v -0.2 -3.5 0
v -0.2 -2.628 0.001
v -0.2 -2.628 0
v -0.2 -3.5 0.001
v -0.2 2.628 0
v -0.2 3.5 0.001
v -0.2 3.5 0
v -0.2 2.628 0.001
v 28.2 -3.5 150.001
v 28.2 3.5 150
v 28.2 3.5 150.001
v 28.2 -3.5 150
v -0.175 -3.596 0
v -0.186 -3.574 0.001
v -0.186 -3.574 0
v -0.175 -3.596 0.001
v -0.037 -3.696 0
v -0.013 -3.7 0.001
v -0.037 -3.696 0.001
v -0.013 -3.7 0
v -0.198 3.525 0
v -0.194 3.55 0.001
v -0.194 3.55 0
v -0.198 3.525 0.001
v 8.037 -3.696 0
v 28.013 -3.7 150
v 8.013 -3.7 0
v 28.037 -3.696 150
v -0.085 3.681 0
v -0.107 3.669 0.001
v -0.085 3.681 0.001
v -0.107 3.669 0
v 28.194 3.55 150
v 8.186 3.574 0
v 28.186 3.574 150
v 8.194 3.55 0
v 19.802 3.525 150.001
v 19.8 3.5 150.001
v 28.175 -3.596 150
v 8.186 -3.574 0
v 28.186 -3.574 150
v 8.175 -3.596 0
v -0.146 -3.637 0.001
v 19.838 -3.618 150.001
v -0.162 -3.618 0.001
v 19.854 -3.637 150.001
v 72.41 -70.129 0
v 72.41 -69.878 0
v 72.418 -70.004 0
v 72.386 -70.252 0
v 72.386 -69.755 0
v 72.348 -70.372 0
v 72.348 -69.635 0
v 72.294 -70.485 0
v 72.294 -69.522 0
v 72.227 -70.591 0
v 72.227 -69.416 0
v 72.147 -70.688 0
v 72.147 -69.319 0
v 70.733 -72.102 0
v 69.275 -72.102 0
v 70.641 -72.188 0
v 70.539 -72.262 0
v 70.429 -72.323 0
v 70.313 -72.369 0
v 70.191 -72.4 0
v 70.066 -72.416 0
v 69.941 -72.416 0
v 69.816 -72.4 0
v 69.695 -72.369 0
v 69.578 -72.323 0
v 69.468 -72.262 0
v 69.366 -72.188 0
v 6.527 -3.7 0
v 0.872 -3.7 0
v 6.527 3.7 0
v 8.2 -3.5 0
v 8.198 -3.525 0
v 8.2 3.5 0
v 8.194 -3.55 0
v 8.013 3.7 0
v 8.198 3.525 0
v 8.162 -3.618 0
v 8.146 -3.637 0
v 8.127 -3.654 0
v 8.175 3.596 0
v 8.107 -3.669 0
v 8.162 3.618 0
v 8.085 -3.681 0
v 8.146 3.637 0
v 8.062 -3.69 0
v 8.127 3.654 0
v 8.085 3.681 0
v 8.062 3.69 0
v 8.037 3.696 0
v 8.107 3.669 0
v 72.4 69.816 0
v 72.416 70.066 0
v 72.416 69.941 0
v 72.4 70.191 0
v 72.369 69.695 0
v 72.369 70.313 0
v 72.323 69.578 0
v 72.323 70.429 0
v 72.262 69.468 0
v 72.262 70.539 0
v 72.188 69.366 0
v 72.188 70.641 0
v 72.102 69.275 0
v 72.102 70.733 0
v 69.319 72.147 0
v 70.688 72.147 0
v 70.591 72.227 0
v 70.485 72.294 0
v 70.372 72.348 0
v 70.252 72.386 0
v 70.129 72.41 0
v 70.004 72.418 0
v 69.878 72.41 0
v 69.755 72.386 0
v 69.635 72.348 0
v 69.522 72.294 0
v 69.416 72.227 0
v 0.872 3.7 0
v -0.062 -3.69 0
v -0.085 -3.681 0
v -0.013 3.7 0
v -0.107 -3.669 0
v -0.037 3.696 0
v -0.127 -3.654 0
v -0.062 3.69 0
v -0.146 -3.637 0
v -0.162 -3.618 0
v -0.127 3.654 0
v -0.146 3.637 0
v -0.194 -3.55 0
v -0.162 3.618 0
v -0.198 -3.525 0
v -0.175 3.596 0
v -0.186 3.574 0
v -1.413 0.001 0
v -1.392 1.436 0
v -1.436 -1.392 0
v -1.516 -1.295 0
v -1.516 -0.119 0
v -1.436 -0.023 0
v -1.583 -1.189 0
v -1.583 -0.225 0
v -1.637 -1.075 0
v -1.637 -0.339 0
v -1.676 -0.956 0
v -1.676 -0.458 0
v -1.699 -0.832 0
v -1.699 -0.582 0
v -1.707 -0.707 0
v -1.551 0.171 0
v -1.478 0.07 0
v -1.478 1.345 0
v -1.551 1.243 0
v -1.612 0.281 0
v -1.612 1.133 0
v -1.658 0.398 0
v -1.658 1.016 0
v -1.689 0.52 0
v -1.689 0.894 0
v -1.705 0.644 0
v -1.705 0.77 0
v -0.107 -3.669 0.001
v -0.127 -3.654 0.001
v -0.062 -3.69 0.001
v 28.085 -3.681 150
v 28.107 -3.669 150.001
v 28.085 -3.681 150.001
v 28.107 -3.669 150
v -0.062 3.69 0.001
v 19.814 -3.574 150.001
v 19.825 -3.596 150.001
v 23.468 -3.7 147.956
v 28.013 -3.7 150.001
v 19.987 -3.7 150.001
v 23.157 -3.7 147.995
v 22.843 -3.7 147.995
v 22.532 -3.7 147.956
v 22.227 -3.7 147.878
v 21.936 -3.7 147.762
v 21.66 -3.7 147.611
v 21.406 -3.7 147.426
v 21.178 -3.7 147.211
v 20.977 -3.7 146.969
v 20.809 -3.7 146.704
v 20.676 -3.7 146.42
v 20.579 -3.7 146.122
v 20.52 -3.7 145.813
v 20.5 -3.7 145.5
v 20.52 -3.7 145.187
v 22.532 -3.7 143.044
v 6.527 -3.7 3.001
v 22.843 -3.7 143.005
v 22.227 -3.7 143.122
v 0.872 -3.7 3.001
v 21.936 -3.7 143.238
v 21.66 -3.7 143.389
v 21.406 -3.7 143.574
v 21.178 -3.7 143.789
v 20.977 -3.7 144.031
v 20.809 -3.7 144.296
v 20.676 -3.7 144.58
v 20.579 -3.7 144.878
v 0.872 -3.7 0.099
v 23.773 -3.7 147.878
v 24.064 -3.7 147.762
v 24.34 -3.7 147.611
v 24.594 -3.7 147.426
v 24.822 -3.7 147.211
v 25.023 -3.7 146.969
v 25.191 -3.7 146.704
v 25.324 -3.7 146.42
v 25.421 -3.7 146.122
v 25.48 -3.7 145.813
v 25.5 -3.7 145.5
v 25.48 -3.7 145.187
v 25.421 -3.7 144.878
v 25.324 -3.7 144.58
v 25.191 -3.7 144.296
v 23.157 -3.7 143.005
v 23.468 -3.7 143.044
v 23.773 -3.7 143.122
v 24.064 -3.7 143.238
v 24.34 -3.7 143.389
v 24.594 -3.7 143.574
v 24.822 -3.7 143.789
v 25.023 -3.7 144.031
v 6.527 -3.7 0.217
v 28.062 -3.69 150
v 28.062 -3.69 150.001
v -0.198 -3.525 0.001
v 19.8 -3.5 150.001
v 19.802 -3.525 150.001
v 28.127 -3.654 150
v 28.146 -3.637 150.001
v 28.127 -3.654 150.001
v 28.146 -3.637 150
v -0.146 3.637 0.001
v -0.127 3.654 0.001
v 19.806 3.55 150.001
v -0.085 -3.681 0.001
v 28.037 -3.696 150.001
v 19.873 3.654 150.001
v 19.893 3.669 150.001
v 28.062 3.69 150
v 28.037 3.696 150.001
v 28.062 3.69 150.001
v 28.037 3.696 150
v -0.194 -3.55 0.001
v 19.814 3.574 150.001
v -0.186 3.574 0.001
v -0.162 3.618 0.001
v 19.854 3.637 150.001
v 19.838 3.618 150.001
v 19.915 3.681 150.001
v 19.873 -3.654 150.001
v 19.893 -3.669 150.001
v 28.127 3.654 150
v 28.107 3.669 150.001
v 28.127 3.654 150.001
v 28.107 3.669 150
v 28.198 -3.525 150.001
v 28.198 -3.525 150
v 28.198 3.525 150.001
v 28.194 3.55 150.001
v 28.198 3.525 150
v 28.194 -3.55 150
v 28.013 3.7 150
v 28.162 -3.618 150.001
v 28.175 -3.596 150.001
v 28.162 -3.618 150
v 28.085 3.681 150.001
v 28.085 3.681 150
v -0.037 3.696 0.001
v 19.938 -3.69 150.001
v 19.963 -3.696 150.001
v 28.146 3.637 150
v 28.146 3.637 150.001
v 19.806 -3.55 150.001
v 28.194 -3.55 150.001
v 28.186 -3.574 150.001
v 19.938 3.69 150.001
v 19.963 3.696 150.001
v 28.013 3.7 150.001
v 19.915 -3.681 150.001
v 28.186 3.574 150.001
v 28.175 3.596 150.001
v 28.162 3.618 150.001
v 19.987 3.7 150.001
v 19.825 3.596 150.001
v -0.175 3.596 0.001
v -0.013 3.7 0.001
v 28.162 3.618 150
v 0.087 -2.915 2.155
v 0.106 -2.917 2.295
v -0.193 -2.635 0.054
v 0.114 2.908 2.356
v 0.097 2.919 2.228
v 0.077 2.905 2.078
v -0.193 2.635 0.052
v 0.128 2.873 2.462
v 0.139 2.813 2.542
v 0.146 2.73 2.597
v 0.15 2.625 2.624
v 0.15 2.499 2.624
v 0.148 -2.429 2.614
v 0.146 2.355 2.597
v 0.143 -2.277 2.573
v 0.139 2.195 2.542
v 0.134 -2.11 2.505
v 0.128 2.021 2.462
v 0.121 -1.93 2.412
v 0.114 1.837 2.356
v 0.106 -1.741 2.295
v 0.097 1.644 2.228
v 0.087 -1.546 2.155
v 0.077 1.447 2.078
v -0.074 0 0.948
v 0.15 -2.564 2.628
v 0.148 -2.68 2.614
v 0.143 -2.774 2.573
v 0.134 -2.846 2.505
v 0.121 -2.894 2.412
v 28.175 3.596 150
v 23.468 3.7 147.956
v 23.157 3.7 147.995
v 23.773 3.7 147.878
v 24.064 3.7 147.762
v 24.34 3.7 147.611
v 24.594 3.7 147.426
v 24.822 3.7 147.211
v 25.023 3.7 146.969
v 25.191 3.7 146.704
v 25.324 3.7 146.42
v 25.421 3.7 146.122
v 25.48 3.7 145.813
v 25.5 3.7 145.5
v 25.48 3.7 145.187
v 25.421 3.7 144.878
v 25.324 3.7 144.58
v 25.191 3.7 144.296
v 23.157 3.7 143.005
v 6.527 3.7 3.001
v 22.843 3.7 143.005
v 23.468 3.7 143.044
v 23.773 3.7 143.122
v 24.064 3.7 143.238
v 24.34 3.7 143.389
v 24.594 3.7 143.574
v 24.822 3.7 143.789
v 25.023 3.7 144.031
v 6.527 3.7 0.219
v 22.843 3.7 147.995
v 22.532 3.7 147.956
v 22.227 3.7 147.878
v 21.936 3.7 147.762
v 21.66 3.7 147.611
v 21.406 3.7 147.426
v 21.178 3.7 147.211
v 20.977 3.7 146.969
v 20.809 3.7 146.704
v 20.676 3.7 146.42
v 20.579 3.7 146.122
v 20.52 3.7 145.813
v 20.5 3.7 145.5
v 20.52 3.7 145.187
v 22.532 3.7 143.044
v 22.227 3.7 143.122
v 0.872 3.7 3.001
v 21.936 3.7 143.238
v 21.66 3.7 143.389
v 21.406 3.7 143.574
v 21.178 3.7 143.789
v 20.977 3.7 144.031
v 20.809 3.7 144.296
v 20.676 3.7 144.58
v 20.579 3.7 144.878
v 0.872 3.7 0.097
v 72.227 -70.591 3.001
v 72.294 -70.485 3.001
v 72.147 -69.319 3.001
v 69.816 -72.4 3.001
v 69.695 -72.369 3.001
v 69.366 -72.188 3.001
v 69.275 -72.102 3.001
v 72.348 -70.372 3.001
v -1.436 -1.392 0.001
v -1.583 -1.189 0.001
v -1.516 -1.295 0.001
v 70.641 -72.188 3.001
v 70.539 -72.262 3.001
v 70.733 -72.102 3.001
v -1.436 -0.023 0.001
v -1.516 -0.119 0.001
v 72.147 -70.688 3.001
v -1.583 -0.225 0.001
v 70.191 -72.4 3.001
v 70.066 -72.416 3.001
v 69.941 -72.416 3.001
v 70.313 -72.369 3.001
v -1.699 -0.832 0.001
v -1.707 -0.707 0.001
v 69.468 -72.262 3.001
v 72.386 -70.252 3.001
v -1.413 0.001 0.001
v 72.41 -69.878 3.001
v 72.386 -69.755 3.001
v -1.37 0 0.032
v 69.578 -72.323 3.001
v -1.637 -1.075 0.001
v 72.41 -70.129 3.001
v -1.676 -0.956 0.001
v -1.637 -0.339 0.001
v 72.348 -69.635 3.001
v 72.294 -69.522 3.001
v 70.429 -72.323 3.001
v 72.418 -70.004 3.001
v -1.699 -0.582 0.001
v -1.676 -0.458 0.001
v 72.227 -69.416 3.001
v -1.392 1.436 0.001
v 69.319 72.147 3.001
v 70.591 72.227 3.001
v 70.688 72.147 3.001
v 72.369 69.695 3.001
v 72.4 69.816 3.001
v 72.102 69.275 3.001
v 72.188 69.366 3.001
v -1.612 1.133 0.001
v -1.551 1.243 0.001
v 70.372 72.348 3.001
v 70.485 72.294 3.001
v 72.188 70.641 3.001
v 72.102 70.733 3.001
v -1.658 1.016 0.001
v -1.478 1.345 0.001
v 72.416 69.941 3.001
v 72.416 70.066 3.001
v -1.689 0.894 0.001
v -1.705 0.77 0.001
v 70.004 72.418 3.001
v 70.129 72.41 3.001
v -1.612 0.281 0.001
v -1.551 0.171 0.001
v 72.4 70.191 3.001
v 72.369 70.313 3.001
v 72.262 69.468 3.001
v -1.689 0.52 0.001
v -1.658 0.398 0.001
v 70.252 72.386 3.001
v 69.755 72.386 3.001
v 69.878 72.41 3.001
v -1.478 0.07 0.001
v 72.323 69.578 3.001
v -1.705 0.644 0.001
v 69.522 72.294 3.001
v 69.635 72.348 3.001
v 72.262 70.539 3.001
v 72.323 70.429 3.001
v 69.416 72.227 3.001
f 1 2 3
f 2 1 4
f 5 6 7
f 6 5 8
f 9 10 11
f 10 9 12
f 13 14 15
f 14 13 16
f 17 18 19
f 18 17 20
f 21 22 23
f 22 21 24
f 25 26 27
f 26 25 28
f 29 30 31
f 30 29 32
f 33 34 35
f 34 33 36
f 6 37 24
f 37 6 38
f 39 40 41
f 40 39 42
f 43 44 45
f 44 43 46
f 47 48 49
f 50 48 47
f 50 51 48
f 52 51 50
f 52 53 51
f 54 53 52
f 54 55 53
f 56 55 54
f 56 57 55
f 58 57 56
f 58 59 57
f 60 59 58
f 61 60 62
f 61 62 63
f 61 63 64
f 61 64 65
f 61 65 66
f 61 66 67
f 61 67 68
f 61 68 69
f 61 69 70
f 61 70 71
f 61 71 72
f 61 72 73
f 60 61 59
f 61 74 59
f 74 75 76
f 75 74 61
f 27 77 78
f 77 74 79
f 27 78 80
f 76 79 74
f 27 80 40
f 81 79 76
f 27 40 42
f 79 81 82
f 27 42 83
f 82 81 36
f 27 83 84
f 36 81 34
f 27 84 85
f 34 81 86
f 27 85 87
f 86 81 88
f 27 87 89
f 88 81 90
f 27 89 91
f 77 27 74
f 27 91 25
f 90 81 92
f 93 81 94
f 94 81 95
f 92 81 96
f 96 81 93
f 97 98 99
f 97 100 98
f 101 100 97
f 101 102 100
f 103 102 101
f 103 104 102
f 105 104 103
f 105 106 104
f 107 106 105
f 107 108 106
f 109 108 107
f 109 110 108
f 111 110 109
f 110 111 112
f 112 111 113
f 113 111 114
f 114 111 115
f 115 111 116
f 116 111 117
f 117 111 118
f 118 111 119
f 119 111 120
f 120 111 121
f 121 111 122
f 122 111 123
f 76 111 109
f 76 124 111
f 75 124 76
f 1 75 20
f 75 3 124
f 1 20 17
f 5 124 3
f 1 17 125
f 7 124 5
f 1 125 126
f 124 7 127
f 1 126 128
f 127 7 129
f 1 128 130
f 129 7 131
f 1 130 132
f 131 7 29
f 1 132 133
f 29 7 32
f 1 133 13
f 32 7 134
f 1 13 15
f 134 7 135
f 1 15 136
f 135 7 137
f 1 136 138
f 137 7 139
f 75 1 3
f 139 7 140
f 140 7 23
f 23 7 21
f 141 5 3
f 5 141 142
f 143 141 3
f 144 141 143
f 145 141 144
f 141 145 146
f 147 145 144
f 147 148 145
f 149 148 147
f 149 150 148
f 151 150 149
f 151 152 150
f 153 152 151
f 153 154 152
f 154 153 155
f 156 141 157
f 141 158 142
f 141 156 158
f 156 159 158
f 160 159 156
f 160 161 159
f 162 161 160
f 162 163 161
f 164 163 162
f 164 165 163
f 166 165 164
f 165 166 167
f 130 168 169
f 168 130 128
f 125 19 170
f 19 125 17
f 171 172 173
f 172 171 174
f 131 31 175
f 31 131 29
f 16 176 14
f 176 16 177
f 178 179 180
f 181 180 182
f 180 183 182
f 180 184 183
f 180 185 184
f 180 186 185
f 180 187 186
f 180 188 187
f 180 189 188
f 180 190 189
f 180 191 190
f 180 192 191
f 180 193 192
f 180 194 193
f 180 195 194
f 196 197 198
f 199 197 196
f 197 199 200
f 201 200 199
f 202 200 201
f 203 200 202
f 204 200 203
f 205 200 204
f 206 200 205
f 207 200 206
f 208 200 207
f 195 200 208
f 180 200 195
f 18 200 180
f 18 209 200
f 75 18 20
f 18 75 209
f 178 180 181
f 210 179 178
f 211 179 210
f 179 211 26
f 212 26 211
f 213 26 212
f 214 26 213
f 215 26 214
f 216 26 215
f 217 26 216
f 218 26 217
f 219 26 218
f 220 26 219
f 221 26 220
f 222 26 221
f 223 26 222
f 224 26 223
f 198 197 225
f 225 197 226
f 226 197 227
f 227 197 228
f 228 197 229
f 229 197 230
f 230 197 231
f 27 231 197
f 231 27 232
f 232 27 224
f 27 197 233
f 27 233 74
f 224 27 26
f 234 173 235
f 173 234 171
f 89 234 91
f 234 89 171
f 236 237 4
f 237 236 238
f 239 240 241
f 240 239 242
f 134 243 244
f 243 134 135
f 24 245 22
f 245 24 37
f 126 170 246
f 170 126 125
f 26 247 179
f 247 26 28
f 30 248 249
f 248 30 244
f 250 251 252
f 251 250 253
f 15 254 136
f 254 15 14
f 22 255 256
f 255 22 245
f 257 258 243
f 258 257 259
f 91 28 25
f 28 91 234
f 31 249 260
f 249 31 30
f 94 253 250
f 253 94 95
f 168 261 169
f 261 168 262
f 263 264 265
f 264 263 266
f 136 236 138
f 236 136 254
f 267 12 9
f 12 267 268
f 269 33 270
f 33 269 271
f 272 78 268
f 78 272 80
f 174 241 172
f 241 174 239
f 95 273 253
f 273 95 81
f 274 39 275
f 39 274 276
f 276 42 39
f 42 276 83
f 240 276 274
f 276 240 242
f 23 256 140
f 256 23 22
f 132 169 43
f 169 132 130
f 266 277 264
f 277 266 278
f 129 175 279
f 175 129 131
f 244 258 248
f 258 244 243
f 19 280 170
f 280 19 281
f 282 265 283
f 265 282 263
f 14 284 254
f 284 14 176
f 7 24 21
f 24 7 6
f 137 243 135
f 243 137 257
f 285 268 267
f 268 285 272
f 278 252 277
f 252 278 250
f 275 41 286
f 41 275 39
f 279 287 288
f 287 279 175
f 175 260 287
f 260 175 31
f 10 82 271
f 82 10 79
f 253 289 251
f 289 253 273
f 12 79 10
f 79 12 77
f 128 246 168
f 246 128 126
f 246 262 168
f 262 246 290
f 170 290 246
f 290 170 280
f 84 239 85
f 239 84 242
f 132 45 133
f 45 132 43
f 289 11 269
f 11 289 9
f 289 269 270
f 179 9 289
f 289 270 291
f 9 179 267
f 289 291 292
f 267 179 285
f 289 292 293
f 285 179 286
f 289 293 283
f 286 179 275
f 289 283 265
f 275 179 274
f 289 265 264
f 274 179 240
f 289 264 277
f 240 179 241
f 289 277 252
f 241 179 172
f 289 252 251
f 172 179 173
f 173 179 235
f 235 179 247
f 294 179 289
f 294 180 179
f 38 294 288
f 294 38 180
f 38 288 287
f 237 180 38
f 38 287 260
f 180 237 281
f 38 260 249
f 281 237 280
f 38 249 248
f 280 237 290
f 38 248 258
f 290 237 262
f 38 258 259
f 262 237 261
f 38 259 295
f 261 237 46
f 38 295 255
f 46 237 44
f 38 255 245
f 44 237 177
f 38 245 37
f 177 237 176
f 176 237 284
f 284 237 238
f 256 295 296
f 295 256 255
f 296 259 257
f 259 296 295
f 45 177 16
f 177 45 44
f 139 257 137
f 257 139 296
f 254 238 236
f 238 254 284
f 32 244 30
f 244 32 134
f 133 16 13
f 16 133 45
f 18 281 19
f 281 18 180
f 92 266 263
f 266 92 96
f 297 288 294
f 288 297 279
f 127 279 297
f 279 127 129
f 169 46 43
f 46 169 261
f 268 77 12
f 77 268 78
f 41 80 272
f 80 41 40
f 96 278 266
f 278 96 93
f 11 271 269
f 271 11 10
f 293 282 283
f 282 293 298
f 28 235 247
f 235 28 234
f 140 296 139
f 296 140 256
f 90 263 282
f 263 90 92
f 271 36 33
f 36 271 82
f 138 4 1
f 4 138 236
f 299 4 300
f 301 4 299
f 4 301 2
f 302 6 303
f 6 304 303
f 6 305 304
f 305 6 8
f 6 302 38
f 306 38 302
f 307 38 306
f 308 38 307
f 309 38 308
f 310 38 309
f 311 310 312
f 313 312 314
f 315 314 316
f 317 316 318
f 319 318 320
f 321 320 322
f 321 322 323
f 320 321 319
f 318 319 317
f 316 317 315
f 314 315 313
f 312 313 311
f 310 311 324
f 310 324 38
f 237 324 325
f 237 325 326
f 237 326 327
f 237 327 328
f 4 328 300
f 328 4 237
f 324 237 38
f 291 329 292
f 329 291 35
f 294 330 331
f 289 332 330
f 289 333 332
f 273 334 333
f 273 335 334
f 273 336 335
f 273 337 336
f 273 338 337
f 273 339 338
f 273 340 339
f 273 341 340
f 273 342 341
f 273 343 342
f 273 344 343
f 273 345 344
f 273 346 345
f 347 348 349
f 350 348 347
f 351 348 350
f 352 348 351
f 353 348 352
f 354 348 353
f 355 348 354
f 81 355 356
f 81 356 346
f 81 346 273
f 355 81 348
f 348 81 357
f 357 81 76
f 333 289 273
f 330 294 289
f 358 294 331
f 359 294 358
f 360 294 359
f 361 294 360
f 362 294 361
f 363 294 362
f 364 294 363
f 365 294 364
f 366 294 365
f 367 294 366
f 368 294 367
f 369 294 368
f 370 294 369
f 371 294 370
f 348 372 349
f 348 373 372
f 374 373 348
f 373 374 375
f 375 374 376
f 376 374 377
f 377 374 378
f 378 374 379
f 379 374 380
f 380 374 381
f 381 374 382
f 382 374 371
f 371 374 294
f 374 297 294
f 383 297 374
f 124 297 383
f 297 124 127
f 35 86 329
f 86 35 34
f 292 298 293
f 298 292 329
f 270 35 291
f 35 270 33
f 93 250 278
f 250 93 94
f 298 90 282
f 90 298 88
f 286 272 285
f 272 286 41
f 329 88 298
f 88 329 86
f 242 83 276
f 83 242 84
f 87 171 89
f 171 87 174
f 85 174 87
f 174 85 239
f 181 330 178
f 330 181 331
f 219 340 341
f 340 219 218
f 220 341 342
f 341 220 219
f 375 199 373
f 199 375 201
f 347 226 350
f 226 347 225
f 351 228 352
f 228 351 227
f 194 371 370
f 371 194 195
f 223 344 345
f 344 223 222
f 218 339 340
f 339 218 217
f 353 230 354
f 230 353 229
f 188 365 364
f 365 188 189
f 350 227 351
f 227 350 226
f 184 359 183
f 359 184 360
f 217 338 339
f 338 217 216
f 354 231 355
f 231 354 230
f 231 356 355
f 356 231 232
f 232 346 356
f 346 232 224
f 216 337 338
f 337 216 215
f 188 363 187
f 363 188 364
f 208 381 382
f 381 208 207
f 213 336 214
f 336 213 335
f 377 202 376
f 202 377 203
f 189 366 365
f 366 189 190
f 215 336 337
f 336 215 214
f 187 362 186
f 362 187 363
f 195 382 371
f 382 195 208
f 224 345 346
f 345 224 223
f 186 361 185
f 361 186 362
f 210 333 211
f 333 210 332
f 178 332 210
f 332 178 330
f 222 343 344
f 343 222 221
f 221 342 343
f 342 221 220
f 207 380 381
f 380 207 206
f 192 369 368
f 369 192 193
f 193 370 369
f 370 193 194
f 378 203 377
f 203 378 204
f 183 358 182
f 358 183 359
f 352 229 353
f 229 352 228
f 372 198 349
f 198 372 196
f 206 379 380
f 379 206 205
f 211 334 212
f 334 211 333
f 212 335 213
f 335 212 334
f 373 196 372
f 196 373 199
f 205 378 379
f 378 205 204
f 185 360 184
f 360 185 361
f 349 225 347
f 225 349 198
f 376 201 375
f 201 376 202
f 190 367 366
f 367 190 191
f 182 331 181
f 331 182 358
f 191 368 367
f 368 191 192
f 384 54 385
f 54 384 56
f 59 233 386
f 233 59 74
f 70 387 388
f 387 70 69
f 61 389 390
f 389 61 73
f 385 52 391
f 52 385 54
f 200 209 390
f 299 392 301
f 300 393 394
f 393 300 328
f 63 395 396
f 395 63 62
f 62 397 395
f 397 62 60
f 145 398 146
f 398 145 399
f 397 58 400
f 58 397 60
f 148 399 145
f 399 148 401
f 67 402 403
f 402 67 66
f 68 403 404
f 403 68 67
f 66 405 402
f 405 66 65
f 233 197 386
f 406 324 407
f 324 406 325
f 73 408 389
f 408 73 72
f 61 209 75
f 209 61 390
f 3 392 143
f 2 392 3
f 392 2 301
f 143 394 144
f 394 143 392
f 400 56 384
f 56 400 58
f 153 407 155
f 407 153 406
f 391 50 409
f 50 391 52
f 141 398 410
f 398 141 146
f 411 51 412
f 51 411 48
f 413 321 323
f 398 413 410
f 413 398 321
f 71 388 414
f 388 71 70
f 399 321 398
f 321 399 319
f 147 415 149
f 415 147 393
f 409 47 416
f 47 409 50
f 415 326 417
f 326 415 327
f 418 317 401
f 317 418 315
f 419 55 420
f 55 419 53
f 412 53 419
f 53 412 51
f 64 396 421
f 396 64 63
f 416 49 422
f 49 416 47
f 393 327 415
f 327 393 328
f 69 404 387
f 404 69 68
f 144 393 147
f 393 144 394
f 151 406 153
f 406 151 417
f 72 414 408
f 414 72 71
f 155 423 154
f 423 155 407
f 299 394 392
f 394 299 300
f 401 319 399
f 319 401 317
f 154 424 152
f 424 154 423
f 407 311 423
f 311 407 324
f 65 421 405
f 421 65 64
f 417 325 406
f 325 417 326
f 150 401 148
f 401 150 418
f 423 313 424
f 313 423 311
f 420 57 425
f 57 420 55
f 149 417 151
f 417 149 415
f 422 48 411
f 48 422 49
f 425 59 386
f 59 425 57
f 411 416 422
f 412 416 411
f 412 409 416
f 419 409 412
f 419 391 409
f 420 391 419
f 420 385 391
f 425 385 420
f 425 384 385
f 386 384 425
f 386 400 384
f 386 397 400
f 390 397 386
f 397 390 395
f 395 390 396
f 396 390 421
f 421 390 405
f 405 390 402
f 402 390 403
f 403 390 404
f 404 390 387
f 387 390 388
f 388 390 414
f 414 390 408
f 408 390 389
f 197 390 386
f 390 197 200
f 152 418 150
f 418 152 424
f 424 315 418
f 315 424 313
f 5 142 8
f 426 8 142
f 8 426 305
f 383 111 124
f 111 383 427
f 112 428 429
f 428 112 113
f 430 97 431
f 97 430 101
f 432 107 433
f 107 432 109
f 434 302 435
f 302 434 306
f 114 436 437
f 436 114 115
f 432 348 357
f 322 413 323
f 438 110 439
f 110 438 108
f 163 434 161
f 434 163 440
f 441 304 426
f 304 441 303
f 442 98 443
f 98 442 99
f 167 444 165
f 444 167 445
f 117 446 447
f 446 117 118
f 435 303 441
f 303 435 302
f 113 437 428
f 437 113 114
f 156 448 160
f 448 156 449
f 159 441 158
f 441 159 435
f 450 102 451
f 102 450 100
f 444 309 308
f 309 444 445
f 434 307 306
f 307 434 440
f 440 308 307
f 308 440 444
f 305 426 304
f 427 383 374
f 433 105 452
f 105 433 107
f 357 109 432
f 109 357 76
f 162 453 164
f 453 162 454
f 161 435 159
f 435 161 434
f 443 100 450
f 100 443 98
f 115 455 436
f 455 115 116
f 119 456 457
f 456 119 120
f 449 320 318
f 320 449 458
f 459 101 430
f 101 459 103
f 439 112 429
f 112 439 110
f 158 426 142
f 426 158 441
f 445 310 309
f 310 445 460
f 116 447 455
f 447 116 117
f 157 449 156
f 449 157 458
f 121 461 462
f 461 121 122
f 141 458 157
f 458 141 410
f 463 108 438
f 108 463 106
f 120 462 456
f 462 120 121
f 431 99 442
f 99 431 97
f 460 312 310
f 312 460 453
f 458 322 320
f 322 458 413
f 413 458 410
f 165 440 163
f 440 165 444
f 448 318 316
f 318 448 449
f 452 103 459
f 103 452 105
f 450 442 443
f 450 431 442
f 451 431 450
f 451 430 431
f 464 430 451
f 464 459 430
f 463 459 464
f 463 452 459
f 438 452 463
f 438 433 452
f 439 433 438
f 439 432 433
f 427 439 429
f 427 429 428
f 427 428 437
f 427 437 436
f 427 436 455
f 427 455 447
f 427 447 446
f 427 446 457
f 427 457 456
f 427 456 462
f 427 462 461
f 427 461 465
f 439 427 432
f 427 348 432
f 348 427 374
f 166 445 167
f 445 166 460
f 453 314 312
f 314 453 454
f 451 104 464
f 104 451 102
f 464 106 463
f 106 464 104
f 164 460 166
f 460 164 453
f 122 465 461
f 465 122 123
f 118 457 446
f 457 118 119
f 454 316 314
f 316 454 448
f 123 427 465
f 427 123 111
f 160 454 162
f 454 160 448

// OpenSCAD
columnThickness_X = 8;
columnThickness_Y =7;
columnHight=150;
footLength=100;
footThickness=2;
	
	
	
standFoot();

module standFoot(standWanted = true){
	$fn =50; 
	
	
	// columnolumnThickness_X x columnThickness_Y
	module e(){

		minkowski() {
		rotate([90,0,0])linear_extrude(columnThickness_Y,center=true){
		polygon([[0,0],[columnThickness_X,0],[20+columnThickness_X,columnHight],[20,columnHight],[0,0]]);
			}
		cylinder(r=0.2,h=0.001);
		}
	}

		// foot
	module r(){


		minkowski() {
		rotate([90,0,-45])linear_extrude(footThickness,center=true){
		polygon([[0,0],[footLength,0],[footLength,3],[3,3],[0,0]]);
			}
		cylinder(r=1,h=0.001);
		}
	}



		
	if(standWanted){
			difference(){
			e();
			translate([(20+columnThickness_X-2.5-2.5),0,columnHight-2.5-2])rotate([90,0,0])cylinder(r=2.5,h=10,center=true);
	}
		
			r();
			rotate([0,0,90])r();
		}
}
